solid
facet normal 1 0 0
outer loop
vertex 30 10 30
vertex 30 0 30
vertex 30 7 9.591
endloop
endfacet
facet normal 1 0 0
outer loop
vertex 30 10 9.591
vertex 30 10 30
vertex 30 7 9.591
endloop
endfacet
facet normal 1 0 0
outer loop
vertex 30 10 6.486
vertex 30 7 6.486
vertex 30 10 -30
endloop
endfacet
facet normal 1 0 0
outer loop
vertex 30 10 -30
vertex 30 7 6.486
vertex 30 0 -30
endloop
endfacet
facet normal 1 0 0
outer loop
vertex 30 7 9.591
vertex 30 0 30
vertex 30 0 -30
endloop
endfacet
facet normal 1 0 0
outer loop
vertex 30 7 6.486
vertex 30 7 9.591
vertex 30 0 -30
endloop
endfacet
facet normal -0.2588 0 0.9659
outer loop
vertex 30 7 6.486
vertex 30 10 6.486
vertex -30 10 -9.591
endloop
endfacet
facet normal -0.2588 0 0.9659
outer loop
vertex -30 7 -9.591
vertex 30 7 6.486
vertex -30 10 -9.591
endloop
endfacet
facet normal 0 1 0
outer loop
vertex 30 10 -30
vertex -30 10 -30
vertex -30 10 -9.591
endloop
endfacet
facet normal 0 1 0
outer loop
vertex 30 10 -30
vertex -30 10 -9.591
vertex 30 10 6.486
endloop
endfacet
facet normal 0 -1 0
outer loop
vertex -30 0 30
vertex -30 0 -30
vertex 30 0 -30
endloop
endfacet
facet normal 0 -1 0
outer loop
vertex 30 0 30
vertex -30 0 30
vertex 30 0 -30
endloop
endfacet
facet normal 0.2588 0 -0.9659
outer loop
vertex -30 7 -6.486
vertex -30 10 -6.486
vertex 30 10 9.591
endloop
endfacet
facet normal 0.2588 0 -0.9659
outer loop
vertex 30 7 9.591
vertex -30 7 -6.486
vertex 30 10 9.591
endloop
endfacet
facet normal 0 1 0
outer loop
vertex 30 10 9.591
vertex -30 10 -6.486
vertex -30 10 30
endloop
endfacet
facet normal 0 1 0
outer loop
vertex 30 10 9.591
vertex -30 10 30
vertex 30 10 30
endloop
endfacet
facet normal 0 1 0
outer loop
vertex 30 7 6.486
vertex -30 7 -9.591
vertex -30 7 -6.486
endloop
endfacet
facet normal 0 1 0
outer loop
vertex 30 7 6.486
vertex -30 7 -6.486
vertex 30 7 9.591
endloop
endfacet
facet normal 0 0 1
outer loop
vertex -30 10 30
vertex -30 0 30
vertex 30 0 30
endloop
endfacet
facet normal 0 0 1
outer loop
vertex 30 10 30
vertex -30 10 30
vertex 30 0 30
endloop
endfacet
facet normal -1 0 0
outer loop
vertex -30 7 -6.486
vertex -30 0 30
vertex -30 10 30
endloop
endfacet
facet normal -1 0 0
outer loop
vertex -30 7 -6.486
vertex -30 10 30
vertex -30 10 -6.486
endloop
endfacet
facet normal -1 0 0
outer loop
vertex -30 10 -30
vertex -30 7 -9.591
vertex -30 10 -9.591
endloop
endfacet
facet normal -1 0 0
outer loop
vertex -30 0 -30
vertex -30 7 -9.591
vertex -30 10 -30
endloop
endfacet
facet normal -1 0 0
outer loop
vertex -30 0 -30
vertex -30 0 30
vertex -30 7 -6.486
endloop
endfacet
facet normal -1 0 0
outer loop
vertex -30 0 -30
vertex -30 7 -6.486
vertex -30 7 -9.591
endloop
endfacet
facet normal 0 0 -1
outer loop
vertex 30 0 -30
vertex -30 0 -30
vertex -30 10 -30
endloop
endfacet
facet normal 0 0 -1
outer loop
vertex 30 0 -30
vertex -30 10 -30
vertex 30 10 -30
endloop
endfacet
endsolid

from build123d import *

# Parameters (mm, degrees)
SKETCH1_W           = 60
SKETCH1_H           = 60
BOSS_EXTRUDE1_DEPTH = 10
CUT_EXTRUDE1_DEPTH  = 3


with BuildPart() as part:
    # Sketch1 → Boss-Extrude1 (new body)
    with BuildSketch(Plane(origin=(0, 0, 0), x_dir=(1, 0, 0), z_dir=(0, 1, 0))):
        Rectangle(SKETCH1_W, SKETCH1_H)
    extrude(amount=BOSS_EXTRUDE1_DEPTH)

    # Sketch2 → Cut-Extrude1 (cut)
    with BuildSketch(Plane(origin=(0, 10, 0), x_dir=(1, 0, 0), z_dir=(0, 1, 0))):
        Polygon((-34.982332013, 7.820573342), (49.768078516, -14.888230718), (50.544535652, -11.990453239), (-34.205874878, 10.718350821), align=None)
    extrude(amount=-CUT_EXTRUDE1_DEPTH, mode=Mode.SUBTRACT)


solid = part.part
